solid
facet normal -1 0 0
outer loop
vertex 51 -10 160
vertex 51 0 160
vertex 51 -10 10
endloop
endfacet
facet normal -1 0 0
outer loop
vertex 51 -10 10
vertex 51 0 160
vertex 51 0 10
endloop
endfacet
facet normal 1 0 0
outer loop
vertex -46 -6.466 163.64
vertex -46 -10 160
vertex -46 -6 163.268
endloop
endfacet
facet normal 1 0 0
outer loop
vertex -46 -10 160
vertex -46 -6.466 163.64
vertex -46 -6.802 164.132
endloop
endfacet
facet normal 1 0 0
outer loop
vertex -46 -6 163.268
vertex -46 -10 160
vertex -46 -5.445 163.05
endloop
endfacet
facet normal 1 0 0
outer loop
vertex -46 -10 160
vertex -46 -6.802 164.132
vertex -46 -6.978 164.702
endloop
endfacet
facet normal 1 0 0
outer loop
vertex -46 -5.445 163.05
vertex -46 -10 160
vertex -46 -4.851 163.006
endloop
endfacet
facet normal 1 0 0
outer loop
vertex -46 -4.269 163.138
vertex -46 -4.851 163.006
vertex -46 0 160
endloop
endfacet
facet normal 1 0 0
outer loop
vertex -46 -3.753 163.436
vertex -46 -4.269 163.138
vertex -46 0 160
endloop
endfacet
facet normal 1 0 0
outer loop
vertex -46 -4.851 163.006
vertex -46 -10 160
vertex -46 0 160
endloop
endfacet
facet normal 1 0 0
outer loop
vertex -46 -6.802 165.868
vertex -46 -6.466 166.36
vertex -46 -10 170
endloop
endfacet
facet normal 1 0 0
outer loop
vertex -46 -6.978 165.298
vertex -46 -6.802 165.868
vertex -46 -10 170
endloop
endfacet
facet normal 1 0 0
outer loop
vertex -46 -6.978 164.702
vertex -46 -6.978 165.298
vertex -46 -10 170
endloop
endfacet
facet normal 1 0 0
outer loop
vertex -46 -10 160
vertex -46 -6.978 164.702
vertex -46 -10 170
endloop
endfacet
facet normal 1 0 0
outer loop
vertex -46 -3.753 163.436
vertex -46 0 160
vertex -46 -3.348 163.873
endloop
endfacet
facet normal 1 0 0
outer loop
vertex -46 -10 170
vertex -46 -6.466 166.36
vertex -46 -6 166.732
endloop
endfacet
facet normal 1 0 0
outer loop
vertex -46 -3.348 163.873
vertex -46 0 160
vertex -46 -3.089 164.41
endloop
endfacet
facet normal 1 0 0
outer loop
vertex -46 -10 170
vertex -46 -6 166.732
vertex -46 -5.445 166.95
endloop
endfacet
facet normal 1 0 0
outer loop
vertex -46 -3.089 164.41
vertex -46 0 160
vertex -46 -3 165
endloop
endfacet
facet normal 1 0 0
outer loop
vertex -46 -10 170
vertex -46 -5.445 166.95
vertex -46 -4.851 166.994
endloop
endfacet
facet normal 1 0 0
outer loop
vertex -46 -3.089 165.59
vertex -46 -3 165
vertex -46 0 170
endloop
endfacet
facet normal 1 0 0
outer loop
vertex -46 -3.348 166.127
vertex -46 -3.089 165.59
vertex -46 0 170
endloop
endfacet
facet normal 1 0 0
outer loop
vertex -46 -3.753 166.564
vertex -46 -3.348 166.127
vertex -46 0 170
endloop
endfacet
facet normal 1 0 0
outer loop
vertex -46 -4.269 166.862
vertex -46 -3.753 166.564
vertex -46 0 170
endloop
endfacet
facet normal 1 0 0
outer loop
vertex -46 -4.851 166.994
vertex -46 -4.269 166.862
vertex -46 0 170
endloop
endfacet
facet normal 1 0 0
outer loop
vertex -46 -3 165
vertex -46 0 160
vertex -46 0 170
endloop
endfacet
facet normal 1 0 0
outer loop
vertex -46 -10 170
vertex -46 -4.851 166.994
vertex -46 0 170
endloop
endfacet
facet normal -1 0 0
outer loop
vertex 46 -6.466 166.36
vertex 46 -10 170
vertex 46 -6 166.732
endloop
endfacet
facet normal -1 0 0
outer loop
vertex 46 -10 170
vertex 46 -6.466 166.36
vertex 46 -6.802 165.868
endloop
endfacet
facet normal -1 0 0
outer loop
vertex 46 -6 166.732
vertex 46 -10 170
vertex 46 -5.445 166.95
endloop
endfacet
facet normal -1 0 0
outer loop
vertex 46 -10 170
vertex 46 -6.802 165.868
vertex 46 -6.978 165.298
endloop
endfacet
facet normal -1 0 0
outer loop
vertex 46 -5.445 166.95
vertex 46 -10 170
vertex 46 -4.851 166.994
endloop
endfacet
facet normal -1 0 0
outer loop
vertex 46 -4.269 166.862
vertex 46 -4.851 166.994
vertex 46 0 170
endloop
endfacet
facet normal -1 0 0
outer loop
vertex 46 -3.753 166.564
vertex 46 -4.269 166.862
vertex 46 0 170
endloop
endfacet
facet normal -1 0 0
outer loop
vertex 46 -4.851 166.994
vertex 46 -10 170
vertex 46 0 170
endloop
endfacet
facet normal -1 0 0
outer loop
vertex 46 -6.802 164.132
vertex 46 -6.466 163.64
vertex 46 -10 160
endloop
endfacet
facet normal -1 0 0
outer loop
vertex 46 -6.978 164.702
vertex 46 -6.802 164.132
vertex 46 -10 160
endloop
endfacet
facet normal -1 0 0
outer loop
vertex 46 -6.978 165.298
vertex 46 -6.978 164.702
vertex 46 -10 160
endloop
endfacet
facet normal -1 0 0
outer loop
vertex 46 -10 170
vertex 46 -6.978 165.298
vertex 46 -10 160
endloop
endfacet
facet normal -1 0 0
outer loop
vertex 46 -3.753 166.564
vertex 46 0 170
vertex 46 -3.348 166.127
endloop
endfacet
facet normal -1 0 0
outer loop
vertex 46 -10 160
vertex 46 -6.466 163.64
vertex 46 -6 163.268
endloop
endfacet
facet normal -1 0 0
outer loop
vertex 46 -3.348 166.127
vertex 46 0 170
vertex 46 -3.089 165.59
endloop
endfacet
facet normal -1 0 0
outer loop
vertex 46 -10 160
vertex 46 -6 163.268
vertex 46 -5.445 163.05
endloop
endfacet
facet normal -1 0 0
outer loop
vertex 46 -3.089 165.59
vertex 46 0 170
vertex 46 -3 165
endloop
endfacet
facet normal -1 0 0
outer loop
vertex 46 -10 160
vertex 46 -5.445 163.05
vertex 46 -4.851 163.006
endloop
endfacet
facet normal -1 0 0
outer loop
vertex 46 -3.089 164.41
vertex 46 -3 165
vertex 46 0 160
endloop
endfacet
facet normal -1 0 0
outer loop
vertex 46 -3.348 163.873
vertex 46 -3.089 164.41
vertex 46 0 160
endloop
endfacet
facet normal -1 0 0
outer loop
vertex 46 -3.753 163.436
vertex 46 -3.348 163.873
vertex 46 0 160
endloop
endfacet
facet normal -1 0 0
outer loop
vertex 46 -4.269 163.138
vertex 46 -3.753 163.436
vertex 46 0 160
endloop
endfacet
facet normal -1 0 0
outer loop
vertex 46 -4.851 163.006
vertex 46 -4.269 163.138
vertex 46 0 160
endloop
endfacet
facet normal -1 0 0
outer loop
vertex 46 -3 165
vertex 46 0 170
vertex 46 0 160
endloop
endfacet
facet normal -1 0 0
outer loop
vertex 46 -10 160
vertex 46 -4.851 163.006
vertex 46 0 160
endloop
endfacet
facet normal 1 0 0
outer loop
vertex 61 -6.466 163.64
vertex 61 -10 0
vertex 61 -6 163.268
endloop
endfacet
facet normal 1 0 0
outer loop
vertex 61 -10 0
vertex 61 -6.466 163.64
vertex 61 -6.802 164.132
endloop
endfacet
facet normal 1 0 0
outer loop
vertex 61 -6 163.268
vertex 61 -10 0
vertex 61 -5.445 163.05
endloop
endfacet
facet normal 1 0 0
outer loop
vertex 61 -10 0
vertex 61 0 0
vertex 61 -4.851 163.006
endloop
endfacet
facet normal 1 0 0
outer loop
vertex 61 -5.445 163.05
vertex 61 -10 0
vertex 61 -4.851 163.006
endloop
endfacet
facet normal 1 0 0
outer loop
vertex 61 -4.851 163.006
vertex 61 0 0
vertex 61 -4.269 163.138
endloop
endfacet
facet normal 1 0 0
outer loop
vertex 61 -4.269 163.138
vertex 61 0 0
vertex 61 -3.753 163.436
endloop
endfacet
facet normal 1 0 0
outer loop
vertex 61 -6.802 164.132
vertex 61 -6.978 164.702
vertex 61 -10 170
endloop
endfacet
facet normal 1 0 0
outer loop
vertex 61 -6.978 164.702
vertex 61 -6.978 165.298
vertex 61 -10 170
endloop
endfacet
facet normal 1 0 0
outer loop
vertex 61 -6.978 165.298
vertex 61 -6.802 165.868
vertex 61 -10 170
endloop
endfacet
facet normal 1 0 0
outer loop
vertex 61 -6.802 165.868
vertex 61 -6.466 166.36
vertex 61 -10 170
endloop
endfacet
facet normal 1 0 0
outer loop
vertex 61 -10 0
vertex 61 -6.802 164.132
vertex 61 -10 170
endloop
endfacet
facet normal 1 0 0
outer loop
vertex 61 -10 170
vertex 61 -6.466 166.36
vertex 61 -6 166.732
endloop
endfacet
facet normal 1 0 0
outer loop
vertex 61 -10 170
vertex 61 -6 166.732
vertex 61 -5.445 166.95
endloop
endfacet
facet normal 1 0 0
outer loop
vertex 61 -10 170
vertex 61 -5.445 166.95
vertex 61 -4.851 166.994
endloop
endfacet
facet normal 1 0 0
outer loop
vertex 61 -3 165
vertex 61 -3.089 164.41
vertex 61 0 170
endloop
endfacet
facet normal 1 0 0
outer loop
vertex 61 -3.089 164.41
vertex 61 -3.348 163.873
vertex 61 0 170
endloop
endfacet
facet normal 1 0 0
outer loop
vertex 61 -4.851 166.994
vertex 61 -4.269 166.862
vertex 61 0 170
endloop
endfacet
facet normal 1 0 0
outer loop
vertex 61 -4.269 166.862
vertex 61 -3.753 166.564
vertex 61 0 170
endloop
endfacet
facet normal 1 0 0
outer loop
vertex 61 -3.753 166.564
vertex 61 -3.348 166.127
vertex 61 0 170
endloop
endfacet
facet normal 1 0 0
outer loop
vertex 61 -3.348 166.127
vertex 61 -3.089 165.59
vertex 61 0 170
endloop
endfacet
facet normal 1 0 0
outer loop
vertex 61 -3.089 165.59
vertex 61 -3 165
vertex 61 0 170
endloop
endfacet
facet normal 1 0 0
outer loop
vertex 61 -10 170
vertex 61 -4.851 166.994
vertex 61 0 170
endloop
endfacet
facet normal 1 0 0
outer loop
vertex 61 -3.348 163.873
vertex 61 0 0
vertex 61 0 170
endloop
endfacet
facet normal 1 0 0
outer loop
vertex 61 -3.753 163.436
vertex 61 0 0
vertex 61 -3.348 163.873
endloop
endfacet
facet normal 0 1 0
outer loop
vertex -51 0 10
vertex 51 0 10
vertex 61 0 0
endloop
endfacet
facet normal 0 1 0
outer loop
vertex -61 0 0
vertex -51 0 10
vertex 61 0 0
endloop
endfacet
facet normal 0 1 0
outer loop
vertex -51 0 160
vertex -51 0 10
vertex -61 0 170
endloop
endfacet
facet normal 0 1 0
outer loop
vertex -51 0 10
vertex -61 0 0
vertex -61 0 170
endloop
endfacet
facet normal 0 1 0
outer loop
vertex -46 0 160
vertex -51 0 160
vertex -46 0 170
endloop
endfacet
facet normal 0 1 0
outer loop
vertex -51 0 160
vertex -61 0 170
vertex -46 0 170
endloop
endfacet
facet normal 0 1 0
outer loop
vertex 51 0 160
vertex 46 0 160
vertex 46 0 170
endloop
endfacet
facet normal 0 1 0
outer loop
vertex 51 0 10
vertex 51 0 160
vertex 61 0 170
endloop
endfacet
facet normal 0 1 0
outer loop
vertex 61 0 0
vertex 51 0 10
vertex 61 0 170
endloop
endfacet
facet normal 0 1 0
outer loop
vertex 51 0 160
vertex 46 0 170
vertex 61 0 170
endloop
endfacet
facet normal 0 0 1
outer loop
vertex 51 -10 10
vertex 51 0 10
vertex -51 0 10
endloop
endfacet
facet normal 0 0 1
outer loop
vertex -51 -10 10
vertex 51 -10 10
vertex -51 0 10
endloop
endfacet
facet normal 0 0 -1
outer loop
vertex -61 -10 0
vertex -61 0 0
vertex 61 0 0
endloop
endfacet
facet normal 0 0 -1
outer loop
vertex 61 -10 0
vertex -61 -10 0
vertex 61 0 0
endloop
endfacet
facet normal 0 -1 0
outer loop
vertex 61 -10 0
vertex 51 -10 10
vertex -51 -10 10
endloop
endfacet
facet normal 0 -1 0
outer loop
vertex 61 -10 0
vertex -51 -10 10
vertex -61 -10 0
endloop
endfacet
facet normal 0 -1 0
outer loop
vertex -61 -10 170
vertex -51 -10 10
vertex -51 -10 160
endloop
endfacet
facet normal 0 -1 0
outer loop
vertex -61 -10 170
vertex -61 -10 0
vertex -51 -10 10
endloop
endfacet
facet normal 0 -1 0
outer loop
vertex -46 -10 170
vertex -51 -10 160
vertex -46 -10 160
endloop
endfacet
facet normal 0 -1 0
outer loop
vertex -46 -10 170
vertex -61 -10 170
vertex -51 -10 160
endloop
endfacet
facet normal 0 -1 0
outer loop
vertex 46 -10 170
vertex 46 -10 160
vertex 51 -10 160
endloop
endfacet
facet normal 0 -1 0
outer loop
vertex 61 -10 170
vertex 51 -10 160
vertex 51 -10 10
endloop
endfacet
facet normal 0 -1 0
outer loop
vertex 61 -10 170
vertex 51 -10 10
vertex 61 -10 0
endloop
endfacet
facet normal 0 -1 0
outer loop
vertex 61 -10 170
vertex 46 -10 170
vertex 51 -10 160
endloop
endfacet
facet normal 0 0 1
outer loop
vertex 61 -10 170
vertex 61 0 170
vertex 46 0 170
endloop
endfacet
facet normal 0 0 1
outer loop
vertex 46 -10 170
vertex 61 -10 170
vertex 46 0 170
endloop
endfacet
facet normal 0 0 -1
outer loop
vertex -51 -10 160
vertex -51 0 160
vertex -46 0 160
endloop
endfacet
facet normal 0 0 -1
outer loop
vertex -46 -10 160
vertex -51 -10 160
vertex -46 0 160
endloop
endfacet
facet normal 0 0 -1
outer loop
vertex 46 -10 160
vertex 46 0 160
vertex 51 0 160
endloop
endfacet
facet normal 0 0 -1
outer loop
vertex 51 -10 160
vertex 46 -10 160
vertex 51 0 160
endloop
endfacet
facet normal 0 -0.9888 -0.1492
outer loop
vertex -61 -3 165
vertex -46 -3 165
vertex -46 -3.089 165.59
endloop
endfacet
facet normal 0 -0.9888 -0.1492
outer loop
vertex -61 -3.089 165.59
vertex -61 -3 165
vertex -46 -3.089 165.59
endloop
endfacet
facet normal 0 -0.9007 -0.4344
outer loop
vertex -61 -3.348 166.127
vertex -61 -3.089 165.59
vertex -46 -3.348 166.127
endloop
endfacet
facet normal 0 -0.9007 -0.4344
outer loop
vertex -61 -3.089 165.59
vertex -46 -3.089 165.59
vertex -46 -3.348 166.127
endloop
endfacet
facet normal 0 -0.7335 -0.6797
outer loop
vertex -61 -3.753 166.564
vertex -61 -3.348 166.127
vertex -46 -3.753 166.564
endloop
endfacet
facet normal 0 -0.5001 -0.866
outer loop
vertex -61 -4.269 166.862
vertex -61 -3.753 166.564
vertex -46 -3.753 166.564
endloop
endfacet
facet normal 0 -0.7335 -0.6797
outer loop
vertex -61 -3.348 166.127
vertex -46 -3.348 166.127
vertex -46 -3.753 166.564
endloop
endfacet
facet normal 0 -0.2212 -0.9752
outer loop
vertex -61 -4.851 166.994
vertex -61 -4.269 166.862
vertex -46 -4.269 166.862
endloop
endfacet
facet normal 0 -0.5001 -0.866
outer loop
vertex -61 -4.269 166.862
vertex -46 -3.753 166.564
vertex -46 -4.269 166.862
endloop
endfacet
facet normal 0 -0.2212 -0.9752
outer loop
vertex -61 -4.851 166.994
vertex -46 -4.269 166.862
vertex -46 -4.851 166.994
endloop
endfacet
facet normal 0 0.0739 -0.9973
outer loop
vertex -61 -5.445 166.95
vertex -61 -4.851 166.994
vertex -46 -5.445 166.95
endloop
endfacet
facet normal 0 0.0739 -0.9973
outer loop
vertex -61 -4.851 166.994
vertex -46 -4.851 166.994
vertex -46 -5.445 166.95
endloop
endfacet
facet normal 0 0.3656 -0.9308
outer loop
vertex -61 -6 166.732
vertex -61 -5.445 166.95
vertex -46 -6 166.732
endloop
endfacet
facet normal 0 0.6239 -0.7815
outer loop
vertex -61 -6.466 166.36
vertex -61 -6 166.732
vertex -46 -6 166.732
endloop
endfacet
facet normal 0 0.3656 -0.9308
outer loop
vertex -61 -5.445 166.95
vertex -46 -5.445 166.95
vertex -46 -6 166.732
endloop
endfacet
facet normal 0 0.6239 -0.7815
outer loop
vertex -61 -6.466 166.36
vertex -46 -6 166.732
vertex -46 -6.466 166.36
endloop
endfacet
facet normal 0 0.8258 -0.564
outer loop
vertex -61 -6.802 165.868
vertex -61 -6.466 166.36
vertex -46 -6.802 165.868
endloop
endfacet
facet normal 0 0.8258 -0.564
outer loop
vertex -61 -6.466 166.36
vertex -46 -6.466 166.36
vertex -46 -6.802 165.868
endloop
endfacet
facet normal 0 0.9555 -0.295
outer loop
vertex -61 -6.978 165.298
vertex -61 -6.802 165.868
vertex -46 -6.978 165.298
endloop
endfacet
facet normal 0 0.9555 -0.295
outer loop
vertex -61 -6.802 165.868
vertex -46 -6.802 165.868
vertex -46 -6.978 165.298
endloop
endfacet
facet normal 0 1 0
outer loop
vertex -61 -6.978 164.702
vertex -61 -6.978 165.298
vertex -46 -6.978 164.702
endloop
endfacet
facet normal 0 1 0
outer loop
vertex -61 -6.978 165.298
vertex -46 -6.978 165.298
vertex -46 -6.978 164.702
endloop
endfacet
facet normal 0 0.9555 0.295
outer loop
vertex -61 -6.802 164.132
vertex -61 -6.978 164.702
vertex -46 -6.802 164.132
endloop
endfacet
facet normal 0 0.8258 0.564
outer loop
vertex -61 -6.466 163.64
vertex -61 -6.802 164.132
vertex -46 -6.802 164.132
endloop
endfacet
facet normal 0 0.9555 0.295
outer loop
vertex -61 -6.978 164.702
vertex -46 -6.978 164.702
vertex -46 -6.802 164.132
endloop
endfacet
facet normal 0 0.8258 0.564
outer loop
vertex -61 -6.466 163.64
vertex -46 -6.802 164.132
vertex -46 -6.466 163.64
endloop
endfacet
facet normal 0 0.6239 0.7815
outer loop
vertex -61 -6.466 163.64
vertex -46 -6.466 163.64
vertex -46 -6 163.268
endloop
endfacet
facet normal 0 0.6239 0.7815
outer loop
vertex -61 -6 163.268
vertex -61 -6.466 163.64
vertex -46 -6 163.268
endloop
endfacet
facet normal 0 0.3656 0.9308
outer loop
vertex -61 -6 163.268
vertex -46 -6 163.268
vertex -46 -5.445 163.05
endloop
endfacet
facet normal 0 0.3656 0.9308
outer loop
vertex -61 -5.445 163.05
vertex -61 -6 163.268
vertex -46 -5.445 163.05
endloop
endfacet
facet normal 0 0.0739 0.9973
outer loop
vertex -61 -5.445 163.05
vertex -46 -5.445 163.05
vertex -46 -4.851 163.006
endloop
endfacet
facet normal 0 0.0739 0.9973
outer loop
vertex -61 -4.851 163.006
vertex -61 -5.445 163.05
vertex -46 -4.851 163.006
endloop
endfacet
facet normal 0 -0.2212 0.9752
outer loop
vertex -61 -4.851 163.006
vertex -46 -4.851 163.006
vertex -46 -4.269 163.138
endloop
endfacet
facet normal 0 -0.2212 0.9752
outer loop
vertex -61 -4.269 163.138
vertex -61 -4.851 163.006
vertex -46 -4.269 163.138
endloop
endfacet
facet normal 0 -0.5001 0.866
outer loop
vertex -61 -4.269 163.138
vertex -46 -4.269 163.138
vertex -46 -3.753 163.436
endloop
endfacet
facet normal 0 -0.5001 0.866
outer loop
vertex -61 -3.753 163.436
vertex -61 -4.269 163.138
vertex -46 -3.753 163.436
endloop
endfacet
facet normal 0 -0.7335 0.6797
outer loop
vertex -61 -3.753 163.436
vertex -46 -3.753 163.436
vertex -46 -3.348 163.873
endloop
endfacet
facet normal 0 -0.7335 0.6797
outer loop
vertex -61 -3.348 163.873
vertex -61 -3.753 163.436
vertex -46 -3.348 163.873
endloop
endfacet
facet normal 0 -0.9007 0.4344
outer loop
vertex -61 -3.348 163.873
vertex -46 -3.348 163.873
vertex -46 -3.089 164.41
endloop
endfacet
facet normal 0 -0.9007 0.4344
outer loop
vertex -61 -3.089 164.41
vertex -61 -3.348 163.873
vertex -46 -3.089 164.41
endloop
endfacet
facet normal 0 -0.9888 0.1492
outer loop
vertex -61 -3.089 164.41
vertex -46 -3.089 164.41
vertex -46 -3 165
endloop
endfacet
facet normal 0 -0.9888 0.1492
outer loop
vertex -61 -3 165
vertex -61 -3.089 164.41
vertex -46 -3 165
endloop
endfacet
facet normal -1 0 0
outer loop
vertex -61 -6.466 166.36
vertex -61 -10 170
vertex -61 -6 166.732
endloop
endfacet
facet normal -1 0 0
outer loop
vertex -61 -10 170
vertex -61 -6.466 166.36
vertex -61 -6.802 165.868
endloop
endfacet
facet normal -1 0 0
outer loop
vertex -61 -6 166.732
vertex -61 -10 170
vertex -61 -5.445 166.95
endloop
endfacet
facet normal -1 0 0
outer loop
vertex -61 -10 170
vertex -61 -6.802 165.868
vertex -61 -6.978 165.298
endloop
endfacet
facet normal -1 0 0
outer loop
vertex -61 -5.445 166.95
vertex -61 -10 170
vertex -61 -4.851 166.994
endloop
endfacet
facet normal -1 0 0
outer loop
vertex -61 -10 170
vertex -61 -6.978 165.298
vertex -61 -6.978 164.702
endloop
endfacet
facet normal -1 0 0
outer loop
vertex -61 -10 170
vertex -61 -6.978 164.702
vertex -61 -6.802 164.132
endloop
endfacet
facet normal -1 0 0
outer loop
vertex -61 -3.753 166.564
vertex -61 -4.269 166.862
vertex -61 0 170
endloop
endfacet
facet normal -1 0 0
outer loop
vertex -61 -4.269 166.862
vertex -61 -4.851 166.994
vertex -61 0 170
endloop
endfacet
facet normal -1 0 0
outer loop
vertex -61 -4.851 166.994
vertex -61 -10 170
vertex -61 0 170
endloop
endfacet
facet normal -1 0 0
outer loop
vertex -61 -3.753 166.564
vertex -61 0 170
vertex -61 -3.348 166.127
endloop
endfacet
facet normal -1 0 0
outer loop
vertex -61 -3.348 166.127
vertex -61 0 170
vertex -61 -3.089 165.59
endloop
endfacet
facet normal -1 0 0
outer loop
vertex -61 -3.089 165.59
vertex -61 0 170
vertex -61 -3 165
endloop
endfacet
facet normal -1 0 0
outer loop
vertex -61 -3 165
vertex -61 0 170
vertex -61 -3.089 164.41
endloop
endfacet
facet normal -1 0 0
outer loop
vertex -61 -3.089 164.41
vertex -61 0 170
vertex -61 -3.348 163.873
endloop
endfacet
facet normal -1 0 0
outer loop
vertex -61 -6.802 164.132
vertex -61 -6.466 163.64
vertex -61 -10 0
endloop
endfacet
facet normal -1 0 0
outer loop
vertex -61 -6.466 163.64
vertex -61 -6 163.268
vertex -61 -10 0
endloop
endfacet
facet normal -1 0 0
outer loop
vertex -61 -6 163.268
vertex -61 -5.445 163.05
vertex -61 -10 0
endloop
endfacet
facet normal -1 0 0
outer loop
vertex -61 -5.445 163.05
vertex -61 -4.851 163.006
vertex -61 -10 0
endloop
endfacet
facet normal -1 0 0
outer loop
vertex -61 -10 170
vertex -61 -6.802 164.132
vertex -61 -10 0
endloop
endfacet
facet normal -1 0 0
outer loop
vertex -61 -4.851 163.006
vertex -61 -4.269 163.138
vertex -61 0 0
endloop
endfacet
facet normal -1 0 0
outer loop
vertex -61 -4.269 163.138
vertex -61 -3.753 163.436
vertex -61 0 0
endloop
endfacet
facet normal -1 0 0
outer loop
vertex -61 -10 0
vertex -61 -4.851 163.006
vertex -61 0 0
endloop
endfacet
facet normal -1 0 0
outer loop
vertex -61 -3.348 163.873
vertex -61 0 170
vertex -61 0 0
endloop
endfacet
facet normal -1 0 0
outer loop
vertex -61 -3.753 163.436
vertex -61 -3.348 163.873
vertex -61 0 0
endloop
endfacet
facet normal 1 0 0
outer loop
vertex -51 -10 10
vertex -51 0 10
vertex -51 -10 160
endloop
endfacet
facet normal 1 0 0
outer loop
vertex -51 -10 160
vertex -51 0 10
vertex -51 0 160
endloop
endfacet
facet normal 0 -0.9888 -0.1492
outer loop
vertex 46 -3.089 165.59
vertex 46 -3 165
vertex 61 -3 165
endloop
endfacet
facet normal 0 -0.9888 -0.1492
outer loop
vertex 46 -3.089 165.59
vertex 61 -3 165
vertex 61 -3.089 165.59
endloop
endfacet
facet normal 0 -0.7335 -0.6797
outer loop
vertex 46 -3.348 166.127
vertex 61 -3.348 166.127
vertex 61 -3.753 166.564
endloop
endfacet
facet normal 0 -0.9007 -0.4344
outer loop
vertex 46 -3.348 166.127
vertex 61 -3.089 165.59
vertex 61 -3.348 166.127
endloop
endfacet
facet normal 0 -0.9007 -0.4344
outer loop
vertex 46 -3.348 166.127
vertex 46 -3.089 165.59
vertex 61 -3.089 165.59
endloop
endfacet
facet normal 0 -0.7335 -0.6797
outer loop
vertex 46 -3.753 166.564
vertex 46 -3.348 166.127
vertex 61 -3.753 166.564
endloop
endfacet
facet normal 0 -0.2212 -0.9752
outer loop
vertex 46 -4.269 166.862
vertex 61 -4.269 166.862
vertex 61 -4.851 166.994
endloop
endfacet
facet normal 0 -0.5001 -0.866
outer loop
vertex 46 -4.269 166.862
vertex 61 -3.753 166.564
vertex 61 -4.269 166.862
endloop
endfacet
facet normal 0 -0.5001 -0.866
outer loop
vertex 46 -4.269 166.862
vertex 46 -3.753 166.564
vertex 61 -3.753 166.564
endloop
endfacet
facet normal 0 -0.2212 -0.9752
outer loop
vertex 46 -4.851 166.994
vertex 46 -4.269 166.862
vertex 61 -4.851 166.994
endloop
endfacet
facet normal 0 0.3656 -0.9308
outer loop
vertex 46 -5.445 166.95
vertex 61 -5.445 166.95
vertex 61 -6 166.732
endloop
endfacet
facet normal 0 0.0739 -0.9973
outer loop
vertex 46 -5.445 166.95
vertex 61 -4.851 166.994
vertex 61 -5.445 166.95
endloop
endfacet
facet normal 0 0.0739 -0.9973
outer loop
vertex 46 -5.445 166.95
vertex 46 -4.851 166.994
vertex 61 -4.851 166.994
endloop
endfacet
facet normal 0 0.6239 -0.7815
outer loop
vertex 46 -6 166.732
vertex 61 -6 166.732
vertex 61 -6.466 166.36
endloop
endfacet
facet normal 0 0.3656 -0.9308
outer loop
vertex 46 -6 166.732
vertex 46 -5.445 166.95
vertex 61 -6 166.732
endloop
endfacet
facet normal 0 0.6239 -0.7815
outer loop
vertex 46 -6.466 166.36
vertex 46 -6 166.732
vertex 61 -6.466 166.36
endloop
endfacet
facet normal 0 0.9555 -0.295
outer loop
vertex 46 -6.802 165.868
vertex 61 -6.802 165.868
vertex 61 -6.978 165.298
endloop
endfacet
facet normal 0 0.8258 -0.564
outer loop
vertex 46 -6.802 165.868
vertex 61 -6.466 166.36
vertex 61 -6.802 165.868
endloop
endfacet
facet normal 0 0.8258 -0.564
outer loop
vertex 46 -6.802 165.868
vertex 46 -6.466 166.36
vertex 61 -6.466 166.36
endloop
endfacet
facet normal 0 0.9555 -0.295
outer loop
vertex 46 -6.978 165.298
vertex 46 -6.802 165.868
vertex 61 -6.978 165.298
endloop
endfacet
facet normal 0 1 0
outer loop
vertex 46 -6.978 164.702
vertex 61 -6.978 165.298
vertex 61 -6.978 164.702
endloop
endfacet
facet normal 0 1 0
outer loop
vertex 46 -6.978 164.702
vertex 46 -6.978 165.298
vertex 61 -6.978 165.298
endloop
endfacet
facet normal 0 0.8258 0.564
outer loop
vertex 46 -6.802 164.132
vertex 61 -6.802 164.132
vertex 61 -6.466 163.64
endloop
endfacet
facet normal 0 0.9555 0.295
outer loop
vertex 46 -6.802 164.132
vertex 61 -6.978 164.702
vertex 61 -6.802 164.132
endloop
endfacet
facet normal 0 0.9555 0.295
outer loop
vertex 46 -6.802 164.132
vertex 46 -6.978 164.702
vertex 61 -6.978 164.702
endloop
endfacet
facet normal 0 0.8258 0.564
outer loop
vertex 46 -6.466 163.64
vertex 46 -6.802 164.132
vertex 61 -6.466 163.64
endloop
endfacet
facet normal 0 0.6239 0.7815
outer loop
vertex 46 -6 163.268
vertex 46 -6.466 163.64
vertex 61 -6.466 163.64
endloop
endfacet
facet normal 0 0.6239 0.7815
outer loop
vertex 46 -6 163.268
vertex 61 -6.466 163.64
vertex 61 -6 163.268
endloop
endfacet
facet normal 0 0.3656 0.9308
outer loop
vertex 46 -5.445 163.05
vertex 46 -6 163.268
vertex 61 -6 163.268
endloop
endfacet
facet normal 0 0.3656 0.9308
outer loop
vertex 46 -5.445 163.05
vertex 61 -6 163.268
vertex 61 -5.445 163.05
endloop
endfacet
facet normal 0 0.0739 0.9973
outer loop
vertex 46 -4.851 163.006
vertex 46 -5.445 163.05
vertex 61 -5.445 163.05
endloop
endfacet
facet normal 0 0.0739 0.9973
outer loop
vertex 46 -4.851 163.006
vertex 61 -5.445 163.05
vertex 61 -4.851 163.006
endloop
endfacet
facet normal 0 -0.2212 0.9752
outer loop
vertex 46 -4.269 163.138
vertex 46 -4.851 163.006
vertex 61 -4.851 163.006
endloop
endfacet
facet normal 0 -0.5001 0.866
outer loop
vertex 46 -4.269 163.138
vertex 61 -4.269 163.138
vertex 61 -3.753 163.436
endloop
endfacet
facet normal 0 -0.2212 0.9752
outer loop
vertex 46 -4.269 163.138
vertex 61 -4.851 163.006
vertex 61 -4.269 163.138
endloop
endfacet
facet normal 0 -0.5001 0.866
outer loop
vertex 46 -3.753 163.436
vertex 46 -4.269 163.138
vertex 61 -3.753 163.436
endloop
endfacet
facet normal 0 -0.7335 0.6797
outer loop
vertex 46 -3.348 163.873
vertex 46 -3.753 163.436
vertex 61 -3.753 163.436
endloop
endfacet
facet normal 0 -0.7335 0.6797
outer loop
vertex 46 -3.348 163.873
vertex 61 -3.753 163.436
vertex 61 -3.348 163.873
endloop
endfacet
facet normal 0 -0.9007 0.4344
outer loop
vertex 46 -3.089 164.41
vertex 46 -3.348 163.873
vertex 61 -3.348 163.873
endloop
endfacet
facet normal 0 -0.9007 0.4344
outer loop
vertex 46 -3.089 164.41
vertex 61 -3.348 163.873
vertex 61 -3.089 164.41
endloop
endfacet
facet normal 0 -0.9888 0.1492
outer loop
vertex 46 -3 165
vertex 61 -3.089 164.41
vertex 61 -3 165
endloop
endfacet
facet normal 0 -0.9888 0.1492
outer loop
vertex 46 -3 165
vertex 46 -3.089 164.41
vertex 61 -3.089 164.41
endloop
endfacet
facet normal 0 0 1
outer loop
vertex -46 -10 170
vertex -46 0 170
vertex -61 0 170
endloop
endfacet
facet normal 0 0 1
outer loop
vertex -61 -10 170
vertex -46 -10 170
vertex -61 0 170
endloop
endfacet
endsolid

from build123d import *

# Parameters (mm, degrees)
F1_DEPTH      = 10
F2_R          = 2
F3_DEPTH      = 15.001
F3_DEPTH_BACK = 107.001


with BuildPart() as f1:
    # F0 (on Front) → F1 (new body)
    with BuildSketch(Plane.XZ):
        Polygon((-61, 170), (-61, 0), (61, 0), (61, 170), (46, 170), (46, 160), (51, 160), (51, 10), (0, 10), (-51, 10), (-51, 160), (-46, 160), (-46, 170), align=None)
    extrude(amount=F1_DEPTH)

    # F2 (on face) → F3 (cut, two sides)
    with BuildSketch(Plane.YZ.offset(-46)) as f3_sk:
        with Locations((-5, 165)):
            Circle(F2_R)
    extrude(amount=-F3_DEPTH, mode=Mode.SUBTRACT)
    extrude(f3_sk.sketch, amount=F3_DEPTH_BACK, mode=Mode.SUBTRACT)


solid = f1.part
